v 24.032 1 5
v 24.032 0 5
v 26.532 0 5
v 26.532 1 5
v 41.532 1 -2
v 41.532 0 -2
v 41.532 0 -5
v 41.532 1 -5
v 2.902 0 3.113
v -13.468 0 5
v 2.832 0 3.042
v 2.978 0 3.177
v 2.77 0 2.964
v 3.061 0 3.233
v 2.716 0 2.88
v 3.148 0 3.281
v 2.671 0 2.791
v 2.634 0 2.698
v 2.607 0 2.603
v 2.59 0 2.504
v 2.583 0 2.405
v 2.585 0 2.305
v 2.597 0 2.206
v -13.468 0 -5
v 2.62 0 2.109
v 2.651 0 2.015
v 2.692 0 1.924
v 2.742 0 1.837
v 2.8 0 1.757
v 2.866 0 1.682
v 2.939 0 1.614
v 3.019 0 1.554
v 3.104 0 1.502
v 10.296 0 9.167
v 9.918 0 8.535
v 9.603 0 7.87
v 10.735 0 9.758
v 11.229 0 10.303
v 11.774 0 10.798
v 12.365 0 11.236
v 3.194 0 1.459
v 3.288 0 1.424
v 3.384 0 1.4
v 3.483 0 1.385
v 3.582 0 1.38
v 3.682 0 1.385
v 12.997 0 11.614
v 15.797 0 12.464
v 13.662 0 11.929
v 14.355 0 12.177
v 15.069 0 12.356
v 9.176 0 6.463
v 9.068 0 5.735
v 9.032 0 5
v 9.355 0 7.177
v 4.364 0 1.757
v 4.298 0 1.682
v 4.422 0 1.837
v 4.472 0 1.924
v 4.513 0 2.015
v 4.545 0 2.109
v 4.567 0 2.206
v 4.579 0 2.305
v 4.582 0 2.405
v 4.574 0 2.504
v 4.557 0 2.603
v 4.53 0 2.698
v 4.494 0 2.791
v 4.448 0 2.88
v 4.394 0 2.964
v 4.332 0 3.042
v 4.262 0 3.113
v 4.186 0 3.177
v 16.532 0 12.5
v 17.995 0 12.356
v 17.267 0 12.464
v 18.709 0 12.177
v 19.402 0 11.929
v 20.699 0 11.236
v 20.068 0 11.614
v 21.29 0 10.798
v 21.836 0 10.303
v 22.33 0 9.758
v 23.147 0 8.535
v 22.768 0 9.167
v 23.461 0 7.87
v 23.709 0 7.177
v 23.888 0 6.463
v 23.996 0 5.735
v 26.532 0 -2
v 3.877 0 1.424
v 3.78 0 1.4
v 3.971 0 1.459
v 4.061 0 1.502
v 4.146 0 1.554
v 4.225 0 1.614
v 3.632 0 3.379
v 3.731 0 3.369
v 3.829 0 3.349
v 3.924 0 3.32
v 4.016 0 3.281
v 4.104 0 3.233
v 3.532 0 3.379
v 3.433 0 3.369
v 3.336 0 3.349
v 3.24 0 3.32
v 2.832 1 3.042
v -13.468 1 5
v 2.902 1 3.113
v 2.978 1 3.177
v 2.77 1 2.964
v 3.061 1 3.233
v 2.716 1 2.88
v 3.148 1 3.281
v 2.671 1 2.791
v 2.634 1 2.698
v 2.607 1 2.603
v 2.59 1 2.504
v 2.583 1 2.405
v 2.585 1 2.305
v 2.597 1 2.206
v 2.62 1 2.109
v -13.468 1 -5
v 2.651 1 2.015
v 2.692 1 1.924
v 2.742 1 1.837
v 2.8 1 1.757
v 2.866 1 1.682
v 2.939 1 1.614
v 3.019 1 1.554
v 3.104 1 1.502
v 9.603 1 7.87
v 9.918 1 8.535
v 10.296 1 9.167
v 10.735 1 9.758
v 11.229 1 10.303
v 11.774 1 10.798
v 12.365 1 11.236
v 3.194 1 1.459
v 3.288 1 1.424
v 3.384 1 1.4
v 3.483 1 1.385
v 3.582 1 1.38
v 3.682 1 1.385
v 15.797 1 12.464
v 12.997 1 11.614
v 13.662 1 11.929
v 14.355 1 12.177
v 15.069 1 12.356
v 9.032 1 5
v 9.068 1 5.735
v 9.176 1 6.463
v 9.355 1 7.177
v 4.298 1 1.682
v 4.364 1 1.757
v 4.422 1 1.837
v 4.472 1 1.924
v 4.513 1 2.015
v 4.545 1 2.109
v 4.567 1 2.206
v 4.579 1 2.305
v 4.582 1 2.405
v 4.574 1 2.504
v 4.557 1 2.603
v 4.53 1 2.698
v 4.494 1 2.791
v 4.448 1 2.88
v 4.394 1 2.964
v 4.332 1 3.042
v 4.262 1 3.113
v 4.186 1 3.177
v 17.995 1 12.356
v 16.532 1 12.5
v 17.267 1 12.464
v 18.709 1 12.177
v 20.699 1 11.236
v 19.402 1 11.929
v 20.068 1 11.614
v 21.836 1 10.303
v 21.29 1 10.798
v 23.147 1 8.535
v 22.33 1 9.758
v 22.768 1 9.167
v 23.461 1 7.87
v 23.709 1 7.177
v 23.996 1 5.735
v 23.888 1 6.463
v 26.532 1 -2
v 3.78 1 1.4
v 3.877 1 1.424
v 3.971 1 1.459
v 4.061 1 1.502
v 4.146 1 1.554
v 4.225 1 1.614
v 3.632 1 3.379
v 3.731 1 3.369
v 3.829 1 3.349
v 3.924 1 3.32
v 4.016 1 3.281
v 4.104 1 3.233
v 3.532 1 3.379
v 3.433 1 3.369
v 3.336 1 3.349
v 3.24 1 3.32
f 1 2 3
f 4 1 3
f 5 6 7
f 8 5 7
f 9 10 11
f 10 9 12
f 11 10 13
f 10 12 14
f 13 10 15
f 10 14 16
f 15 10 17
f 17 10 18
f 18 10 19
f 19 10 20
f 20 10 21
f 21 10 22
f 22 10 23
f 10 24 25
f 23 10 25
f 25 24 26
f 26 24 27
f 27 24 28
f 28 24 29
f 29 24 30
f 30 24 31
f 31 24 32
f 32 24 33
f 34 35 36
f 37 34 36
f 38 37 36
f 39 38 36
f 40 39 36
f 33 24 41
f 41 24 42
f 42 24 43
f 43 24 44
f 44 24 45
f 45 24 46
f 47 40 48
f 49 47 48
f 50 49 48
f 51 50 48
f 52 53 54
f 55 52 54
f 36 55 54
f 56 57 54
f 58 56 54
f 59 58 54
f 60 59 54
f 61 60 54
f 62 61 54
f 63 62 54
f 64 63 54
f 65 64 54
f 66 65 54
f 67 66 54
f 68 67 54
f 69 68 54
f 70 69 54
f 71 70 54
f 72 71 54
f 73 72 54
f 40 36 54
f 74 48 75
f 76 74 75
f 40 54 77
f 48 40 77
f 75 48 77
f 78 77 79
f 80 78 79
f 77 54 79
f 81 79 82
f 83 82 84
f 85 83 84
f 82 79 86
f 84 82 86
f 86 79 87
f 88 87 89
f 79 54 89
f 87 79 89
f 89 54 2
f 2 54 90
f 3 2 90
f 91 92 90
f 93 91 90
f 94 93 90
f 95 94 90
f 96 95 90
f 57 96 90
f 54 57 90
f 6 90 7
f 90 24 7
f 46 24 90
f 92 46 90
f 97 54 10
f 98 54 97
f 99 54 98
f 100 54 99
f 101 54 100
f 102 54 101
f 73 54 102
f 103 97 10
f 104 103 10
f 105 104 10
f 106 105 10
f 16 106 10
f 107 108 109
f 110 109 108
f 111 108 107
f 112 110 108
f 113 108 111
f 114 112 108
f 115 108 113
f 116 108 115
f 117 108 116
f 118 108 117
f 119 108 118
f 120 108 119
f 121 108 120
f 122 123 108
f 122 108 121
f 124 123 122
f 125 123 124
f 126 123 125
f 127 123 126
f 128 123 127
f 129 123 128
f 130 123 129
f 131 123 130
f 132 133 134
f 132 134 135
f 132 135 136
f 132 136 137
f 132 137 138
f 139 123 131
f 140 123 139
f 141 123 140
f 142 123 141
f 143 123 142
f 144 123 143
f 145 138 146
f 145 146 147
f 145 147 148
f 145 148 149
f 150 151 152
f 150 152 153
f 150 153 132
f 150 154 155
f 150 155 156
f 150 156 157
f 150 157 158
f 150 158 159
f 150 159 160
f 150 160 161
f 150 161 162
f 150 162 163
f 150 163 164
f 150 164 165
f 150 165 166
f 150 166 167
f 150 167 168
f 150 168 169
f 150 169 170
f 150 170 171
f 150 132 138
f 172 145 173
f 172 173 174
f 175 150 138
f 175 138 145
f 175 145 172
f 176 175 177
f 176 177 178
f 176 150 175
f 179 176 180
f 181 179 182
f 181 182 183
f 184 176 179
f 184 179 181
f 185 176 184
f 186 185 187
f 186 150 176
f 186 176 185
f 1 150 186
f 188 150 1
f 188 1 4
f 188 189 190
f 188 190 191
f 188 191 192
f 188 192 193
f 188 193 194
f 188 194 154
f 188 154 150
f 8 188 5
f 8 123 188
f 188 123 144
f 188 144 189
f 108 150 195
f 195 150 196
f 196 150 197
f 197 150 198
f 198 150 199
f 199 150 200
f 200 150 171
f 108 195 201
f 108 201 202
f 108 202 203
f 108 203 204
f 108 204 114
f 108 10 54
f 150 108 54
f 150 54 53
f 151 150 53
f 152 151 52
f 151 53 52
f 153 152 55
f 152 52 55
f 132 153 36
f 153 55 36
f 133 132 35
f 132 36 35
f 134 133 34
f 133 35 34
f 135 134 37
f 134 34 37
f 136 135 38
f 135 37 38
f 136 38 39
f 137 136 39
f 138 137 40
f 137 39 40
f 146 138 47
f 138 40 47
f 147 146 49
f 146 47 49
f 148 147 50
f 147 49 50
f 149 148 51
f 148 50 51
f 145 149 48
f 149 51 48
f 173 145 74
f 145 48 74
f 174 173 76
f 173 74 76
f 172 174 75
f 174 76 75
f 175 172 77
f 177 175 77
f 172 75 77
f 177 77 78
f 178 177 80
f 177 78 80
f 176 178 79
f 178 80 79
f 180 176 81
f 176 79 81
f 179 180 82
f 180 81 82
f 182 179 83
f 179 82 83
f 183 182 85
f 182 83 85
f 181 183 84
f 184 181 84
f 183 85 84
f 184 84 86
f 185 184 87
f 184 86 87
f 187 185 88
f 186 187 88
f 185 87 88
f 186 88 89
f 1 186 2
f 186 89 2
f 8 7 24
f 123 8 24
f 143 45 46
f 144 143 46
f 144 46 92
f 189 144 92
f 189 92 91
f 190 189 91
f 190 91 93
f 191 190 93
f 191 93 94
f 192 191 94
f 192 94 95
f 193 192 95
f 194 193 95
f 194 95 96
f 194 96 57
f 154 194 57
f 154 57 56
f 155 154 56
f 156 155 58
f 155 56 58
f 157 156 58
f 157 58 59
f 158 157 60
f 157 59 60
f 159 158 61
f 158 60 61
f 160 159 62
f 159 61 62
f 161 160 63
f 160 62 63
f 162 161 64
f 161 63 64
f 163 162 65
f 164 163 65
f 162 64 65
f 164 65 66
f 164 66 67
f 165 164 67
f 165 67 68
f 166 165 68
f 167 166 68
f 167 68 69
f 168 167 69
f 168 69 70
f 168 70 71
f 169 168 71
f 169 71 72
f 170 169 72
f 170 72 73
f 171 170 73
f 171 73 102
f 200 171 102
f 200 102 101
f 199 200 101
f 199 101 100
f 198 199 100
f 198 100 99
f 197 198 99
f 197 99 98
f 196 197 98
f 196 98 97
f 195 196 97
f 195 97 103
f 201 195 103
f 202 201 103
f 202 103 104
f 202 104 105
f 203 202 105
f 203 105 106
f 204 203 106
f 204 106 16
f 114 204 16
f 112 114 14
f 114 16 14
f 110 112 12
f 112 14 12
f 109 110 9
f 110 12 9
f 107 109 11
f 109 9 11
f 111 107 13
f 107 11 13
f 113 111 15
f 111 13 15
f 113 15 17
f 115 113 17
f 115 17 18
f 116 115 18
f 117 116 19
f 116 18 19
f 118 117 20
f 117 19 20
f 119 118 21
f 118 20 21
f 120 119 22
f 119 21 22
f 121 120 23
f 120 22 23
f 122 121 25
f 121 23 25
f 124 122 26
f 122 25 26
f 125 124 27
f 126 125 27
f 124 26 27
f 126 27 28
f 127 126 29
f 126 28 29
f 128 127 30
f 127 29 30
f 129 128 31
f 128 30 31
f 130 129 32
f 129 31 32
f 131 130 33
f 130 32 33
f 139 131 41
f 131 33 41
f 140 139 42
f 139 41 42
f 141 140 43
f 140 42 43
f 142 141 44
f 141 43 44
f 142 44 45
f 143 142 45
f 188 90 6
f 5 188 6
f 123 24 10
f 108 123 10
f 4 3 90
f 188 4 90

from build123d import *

# Parameters (mm, degrees)
BOSS_EXTRUDE6_DEPTH = 1
SKETCH7_R           = 1
CUT_EXTRUDE1_DEPTH  = 10


with BuildPart() as part:
    # Sketch3 → Boss-Extrude6 (new body)
    with BuildSketch(Plane(origin=(0, 0, 0), x_dir=(1, 0, 0), z_dir=(0, 1, 0))):
        with BuildLine():
            Line((24.032258065, -5), (26.532258065, -5))
            Line((26.532258065, -5), (26.532258065, 2))
            Line((26.532258065, 2), (41.532258065, 2))
            Line((41.532258065, 2), (41.532258065, 5))
            Line((41.532258065, 5), (26.532258065, 5))
            Line((26.532258065, 5), (-13.467741935, 5))
            Line((-13.467741935, 5), (-13.467741935, -5))
            Line((-13.467741935, -5), (9.032258065, -5))
            ThreePointArc((9.032258065, -5), (16.532258065, -12.5), (24.032258065, -5))
        make_face()
    extrude(amount=BOSS_EXTRUDE6_DEPTH)

    # Sketch7 → Cut-Extrude1 (cut)
    with BuildSketch(Plane.XZ):
        with Locations(Location((3.582258065, 2.38, 0), (0, 0, 270))):
            Circle(SKETCH7_R)
    extrude(amount=-CUT_EXTRUDE1_DEPTH, mode=Mode.SUBTRACT)


solid = part.part
